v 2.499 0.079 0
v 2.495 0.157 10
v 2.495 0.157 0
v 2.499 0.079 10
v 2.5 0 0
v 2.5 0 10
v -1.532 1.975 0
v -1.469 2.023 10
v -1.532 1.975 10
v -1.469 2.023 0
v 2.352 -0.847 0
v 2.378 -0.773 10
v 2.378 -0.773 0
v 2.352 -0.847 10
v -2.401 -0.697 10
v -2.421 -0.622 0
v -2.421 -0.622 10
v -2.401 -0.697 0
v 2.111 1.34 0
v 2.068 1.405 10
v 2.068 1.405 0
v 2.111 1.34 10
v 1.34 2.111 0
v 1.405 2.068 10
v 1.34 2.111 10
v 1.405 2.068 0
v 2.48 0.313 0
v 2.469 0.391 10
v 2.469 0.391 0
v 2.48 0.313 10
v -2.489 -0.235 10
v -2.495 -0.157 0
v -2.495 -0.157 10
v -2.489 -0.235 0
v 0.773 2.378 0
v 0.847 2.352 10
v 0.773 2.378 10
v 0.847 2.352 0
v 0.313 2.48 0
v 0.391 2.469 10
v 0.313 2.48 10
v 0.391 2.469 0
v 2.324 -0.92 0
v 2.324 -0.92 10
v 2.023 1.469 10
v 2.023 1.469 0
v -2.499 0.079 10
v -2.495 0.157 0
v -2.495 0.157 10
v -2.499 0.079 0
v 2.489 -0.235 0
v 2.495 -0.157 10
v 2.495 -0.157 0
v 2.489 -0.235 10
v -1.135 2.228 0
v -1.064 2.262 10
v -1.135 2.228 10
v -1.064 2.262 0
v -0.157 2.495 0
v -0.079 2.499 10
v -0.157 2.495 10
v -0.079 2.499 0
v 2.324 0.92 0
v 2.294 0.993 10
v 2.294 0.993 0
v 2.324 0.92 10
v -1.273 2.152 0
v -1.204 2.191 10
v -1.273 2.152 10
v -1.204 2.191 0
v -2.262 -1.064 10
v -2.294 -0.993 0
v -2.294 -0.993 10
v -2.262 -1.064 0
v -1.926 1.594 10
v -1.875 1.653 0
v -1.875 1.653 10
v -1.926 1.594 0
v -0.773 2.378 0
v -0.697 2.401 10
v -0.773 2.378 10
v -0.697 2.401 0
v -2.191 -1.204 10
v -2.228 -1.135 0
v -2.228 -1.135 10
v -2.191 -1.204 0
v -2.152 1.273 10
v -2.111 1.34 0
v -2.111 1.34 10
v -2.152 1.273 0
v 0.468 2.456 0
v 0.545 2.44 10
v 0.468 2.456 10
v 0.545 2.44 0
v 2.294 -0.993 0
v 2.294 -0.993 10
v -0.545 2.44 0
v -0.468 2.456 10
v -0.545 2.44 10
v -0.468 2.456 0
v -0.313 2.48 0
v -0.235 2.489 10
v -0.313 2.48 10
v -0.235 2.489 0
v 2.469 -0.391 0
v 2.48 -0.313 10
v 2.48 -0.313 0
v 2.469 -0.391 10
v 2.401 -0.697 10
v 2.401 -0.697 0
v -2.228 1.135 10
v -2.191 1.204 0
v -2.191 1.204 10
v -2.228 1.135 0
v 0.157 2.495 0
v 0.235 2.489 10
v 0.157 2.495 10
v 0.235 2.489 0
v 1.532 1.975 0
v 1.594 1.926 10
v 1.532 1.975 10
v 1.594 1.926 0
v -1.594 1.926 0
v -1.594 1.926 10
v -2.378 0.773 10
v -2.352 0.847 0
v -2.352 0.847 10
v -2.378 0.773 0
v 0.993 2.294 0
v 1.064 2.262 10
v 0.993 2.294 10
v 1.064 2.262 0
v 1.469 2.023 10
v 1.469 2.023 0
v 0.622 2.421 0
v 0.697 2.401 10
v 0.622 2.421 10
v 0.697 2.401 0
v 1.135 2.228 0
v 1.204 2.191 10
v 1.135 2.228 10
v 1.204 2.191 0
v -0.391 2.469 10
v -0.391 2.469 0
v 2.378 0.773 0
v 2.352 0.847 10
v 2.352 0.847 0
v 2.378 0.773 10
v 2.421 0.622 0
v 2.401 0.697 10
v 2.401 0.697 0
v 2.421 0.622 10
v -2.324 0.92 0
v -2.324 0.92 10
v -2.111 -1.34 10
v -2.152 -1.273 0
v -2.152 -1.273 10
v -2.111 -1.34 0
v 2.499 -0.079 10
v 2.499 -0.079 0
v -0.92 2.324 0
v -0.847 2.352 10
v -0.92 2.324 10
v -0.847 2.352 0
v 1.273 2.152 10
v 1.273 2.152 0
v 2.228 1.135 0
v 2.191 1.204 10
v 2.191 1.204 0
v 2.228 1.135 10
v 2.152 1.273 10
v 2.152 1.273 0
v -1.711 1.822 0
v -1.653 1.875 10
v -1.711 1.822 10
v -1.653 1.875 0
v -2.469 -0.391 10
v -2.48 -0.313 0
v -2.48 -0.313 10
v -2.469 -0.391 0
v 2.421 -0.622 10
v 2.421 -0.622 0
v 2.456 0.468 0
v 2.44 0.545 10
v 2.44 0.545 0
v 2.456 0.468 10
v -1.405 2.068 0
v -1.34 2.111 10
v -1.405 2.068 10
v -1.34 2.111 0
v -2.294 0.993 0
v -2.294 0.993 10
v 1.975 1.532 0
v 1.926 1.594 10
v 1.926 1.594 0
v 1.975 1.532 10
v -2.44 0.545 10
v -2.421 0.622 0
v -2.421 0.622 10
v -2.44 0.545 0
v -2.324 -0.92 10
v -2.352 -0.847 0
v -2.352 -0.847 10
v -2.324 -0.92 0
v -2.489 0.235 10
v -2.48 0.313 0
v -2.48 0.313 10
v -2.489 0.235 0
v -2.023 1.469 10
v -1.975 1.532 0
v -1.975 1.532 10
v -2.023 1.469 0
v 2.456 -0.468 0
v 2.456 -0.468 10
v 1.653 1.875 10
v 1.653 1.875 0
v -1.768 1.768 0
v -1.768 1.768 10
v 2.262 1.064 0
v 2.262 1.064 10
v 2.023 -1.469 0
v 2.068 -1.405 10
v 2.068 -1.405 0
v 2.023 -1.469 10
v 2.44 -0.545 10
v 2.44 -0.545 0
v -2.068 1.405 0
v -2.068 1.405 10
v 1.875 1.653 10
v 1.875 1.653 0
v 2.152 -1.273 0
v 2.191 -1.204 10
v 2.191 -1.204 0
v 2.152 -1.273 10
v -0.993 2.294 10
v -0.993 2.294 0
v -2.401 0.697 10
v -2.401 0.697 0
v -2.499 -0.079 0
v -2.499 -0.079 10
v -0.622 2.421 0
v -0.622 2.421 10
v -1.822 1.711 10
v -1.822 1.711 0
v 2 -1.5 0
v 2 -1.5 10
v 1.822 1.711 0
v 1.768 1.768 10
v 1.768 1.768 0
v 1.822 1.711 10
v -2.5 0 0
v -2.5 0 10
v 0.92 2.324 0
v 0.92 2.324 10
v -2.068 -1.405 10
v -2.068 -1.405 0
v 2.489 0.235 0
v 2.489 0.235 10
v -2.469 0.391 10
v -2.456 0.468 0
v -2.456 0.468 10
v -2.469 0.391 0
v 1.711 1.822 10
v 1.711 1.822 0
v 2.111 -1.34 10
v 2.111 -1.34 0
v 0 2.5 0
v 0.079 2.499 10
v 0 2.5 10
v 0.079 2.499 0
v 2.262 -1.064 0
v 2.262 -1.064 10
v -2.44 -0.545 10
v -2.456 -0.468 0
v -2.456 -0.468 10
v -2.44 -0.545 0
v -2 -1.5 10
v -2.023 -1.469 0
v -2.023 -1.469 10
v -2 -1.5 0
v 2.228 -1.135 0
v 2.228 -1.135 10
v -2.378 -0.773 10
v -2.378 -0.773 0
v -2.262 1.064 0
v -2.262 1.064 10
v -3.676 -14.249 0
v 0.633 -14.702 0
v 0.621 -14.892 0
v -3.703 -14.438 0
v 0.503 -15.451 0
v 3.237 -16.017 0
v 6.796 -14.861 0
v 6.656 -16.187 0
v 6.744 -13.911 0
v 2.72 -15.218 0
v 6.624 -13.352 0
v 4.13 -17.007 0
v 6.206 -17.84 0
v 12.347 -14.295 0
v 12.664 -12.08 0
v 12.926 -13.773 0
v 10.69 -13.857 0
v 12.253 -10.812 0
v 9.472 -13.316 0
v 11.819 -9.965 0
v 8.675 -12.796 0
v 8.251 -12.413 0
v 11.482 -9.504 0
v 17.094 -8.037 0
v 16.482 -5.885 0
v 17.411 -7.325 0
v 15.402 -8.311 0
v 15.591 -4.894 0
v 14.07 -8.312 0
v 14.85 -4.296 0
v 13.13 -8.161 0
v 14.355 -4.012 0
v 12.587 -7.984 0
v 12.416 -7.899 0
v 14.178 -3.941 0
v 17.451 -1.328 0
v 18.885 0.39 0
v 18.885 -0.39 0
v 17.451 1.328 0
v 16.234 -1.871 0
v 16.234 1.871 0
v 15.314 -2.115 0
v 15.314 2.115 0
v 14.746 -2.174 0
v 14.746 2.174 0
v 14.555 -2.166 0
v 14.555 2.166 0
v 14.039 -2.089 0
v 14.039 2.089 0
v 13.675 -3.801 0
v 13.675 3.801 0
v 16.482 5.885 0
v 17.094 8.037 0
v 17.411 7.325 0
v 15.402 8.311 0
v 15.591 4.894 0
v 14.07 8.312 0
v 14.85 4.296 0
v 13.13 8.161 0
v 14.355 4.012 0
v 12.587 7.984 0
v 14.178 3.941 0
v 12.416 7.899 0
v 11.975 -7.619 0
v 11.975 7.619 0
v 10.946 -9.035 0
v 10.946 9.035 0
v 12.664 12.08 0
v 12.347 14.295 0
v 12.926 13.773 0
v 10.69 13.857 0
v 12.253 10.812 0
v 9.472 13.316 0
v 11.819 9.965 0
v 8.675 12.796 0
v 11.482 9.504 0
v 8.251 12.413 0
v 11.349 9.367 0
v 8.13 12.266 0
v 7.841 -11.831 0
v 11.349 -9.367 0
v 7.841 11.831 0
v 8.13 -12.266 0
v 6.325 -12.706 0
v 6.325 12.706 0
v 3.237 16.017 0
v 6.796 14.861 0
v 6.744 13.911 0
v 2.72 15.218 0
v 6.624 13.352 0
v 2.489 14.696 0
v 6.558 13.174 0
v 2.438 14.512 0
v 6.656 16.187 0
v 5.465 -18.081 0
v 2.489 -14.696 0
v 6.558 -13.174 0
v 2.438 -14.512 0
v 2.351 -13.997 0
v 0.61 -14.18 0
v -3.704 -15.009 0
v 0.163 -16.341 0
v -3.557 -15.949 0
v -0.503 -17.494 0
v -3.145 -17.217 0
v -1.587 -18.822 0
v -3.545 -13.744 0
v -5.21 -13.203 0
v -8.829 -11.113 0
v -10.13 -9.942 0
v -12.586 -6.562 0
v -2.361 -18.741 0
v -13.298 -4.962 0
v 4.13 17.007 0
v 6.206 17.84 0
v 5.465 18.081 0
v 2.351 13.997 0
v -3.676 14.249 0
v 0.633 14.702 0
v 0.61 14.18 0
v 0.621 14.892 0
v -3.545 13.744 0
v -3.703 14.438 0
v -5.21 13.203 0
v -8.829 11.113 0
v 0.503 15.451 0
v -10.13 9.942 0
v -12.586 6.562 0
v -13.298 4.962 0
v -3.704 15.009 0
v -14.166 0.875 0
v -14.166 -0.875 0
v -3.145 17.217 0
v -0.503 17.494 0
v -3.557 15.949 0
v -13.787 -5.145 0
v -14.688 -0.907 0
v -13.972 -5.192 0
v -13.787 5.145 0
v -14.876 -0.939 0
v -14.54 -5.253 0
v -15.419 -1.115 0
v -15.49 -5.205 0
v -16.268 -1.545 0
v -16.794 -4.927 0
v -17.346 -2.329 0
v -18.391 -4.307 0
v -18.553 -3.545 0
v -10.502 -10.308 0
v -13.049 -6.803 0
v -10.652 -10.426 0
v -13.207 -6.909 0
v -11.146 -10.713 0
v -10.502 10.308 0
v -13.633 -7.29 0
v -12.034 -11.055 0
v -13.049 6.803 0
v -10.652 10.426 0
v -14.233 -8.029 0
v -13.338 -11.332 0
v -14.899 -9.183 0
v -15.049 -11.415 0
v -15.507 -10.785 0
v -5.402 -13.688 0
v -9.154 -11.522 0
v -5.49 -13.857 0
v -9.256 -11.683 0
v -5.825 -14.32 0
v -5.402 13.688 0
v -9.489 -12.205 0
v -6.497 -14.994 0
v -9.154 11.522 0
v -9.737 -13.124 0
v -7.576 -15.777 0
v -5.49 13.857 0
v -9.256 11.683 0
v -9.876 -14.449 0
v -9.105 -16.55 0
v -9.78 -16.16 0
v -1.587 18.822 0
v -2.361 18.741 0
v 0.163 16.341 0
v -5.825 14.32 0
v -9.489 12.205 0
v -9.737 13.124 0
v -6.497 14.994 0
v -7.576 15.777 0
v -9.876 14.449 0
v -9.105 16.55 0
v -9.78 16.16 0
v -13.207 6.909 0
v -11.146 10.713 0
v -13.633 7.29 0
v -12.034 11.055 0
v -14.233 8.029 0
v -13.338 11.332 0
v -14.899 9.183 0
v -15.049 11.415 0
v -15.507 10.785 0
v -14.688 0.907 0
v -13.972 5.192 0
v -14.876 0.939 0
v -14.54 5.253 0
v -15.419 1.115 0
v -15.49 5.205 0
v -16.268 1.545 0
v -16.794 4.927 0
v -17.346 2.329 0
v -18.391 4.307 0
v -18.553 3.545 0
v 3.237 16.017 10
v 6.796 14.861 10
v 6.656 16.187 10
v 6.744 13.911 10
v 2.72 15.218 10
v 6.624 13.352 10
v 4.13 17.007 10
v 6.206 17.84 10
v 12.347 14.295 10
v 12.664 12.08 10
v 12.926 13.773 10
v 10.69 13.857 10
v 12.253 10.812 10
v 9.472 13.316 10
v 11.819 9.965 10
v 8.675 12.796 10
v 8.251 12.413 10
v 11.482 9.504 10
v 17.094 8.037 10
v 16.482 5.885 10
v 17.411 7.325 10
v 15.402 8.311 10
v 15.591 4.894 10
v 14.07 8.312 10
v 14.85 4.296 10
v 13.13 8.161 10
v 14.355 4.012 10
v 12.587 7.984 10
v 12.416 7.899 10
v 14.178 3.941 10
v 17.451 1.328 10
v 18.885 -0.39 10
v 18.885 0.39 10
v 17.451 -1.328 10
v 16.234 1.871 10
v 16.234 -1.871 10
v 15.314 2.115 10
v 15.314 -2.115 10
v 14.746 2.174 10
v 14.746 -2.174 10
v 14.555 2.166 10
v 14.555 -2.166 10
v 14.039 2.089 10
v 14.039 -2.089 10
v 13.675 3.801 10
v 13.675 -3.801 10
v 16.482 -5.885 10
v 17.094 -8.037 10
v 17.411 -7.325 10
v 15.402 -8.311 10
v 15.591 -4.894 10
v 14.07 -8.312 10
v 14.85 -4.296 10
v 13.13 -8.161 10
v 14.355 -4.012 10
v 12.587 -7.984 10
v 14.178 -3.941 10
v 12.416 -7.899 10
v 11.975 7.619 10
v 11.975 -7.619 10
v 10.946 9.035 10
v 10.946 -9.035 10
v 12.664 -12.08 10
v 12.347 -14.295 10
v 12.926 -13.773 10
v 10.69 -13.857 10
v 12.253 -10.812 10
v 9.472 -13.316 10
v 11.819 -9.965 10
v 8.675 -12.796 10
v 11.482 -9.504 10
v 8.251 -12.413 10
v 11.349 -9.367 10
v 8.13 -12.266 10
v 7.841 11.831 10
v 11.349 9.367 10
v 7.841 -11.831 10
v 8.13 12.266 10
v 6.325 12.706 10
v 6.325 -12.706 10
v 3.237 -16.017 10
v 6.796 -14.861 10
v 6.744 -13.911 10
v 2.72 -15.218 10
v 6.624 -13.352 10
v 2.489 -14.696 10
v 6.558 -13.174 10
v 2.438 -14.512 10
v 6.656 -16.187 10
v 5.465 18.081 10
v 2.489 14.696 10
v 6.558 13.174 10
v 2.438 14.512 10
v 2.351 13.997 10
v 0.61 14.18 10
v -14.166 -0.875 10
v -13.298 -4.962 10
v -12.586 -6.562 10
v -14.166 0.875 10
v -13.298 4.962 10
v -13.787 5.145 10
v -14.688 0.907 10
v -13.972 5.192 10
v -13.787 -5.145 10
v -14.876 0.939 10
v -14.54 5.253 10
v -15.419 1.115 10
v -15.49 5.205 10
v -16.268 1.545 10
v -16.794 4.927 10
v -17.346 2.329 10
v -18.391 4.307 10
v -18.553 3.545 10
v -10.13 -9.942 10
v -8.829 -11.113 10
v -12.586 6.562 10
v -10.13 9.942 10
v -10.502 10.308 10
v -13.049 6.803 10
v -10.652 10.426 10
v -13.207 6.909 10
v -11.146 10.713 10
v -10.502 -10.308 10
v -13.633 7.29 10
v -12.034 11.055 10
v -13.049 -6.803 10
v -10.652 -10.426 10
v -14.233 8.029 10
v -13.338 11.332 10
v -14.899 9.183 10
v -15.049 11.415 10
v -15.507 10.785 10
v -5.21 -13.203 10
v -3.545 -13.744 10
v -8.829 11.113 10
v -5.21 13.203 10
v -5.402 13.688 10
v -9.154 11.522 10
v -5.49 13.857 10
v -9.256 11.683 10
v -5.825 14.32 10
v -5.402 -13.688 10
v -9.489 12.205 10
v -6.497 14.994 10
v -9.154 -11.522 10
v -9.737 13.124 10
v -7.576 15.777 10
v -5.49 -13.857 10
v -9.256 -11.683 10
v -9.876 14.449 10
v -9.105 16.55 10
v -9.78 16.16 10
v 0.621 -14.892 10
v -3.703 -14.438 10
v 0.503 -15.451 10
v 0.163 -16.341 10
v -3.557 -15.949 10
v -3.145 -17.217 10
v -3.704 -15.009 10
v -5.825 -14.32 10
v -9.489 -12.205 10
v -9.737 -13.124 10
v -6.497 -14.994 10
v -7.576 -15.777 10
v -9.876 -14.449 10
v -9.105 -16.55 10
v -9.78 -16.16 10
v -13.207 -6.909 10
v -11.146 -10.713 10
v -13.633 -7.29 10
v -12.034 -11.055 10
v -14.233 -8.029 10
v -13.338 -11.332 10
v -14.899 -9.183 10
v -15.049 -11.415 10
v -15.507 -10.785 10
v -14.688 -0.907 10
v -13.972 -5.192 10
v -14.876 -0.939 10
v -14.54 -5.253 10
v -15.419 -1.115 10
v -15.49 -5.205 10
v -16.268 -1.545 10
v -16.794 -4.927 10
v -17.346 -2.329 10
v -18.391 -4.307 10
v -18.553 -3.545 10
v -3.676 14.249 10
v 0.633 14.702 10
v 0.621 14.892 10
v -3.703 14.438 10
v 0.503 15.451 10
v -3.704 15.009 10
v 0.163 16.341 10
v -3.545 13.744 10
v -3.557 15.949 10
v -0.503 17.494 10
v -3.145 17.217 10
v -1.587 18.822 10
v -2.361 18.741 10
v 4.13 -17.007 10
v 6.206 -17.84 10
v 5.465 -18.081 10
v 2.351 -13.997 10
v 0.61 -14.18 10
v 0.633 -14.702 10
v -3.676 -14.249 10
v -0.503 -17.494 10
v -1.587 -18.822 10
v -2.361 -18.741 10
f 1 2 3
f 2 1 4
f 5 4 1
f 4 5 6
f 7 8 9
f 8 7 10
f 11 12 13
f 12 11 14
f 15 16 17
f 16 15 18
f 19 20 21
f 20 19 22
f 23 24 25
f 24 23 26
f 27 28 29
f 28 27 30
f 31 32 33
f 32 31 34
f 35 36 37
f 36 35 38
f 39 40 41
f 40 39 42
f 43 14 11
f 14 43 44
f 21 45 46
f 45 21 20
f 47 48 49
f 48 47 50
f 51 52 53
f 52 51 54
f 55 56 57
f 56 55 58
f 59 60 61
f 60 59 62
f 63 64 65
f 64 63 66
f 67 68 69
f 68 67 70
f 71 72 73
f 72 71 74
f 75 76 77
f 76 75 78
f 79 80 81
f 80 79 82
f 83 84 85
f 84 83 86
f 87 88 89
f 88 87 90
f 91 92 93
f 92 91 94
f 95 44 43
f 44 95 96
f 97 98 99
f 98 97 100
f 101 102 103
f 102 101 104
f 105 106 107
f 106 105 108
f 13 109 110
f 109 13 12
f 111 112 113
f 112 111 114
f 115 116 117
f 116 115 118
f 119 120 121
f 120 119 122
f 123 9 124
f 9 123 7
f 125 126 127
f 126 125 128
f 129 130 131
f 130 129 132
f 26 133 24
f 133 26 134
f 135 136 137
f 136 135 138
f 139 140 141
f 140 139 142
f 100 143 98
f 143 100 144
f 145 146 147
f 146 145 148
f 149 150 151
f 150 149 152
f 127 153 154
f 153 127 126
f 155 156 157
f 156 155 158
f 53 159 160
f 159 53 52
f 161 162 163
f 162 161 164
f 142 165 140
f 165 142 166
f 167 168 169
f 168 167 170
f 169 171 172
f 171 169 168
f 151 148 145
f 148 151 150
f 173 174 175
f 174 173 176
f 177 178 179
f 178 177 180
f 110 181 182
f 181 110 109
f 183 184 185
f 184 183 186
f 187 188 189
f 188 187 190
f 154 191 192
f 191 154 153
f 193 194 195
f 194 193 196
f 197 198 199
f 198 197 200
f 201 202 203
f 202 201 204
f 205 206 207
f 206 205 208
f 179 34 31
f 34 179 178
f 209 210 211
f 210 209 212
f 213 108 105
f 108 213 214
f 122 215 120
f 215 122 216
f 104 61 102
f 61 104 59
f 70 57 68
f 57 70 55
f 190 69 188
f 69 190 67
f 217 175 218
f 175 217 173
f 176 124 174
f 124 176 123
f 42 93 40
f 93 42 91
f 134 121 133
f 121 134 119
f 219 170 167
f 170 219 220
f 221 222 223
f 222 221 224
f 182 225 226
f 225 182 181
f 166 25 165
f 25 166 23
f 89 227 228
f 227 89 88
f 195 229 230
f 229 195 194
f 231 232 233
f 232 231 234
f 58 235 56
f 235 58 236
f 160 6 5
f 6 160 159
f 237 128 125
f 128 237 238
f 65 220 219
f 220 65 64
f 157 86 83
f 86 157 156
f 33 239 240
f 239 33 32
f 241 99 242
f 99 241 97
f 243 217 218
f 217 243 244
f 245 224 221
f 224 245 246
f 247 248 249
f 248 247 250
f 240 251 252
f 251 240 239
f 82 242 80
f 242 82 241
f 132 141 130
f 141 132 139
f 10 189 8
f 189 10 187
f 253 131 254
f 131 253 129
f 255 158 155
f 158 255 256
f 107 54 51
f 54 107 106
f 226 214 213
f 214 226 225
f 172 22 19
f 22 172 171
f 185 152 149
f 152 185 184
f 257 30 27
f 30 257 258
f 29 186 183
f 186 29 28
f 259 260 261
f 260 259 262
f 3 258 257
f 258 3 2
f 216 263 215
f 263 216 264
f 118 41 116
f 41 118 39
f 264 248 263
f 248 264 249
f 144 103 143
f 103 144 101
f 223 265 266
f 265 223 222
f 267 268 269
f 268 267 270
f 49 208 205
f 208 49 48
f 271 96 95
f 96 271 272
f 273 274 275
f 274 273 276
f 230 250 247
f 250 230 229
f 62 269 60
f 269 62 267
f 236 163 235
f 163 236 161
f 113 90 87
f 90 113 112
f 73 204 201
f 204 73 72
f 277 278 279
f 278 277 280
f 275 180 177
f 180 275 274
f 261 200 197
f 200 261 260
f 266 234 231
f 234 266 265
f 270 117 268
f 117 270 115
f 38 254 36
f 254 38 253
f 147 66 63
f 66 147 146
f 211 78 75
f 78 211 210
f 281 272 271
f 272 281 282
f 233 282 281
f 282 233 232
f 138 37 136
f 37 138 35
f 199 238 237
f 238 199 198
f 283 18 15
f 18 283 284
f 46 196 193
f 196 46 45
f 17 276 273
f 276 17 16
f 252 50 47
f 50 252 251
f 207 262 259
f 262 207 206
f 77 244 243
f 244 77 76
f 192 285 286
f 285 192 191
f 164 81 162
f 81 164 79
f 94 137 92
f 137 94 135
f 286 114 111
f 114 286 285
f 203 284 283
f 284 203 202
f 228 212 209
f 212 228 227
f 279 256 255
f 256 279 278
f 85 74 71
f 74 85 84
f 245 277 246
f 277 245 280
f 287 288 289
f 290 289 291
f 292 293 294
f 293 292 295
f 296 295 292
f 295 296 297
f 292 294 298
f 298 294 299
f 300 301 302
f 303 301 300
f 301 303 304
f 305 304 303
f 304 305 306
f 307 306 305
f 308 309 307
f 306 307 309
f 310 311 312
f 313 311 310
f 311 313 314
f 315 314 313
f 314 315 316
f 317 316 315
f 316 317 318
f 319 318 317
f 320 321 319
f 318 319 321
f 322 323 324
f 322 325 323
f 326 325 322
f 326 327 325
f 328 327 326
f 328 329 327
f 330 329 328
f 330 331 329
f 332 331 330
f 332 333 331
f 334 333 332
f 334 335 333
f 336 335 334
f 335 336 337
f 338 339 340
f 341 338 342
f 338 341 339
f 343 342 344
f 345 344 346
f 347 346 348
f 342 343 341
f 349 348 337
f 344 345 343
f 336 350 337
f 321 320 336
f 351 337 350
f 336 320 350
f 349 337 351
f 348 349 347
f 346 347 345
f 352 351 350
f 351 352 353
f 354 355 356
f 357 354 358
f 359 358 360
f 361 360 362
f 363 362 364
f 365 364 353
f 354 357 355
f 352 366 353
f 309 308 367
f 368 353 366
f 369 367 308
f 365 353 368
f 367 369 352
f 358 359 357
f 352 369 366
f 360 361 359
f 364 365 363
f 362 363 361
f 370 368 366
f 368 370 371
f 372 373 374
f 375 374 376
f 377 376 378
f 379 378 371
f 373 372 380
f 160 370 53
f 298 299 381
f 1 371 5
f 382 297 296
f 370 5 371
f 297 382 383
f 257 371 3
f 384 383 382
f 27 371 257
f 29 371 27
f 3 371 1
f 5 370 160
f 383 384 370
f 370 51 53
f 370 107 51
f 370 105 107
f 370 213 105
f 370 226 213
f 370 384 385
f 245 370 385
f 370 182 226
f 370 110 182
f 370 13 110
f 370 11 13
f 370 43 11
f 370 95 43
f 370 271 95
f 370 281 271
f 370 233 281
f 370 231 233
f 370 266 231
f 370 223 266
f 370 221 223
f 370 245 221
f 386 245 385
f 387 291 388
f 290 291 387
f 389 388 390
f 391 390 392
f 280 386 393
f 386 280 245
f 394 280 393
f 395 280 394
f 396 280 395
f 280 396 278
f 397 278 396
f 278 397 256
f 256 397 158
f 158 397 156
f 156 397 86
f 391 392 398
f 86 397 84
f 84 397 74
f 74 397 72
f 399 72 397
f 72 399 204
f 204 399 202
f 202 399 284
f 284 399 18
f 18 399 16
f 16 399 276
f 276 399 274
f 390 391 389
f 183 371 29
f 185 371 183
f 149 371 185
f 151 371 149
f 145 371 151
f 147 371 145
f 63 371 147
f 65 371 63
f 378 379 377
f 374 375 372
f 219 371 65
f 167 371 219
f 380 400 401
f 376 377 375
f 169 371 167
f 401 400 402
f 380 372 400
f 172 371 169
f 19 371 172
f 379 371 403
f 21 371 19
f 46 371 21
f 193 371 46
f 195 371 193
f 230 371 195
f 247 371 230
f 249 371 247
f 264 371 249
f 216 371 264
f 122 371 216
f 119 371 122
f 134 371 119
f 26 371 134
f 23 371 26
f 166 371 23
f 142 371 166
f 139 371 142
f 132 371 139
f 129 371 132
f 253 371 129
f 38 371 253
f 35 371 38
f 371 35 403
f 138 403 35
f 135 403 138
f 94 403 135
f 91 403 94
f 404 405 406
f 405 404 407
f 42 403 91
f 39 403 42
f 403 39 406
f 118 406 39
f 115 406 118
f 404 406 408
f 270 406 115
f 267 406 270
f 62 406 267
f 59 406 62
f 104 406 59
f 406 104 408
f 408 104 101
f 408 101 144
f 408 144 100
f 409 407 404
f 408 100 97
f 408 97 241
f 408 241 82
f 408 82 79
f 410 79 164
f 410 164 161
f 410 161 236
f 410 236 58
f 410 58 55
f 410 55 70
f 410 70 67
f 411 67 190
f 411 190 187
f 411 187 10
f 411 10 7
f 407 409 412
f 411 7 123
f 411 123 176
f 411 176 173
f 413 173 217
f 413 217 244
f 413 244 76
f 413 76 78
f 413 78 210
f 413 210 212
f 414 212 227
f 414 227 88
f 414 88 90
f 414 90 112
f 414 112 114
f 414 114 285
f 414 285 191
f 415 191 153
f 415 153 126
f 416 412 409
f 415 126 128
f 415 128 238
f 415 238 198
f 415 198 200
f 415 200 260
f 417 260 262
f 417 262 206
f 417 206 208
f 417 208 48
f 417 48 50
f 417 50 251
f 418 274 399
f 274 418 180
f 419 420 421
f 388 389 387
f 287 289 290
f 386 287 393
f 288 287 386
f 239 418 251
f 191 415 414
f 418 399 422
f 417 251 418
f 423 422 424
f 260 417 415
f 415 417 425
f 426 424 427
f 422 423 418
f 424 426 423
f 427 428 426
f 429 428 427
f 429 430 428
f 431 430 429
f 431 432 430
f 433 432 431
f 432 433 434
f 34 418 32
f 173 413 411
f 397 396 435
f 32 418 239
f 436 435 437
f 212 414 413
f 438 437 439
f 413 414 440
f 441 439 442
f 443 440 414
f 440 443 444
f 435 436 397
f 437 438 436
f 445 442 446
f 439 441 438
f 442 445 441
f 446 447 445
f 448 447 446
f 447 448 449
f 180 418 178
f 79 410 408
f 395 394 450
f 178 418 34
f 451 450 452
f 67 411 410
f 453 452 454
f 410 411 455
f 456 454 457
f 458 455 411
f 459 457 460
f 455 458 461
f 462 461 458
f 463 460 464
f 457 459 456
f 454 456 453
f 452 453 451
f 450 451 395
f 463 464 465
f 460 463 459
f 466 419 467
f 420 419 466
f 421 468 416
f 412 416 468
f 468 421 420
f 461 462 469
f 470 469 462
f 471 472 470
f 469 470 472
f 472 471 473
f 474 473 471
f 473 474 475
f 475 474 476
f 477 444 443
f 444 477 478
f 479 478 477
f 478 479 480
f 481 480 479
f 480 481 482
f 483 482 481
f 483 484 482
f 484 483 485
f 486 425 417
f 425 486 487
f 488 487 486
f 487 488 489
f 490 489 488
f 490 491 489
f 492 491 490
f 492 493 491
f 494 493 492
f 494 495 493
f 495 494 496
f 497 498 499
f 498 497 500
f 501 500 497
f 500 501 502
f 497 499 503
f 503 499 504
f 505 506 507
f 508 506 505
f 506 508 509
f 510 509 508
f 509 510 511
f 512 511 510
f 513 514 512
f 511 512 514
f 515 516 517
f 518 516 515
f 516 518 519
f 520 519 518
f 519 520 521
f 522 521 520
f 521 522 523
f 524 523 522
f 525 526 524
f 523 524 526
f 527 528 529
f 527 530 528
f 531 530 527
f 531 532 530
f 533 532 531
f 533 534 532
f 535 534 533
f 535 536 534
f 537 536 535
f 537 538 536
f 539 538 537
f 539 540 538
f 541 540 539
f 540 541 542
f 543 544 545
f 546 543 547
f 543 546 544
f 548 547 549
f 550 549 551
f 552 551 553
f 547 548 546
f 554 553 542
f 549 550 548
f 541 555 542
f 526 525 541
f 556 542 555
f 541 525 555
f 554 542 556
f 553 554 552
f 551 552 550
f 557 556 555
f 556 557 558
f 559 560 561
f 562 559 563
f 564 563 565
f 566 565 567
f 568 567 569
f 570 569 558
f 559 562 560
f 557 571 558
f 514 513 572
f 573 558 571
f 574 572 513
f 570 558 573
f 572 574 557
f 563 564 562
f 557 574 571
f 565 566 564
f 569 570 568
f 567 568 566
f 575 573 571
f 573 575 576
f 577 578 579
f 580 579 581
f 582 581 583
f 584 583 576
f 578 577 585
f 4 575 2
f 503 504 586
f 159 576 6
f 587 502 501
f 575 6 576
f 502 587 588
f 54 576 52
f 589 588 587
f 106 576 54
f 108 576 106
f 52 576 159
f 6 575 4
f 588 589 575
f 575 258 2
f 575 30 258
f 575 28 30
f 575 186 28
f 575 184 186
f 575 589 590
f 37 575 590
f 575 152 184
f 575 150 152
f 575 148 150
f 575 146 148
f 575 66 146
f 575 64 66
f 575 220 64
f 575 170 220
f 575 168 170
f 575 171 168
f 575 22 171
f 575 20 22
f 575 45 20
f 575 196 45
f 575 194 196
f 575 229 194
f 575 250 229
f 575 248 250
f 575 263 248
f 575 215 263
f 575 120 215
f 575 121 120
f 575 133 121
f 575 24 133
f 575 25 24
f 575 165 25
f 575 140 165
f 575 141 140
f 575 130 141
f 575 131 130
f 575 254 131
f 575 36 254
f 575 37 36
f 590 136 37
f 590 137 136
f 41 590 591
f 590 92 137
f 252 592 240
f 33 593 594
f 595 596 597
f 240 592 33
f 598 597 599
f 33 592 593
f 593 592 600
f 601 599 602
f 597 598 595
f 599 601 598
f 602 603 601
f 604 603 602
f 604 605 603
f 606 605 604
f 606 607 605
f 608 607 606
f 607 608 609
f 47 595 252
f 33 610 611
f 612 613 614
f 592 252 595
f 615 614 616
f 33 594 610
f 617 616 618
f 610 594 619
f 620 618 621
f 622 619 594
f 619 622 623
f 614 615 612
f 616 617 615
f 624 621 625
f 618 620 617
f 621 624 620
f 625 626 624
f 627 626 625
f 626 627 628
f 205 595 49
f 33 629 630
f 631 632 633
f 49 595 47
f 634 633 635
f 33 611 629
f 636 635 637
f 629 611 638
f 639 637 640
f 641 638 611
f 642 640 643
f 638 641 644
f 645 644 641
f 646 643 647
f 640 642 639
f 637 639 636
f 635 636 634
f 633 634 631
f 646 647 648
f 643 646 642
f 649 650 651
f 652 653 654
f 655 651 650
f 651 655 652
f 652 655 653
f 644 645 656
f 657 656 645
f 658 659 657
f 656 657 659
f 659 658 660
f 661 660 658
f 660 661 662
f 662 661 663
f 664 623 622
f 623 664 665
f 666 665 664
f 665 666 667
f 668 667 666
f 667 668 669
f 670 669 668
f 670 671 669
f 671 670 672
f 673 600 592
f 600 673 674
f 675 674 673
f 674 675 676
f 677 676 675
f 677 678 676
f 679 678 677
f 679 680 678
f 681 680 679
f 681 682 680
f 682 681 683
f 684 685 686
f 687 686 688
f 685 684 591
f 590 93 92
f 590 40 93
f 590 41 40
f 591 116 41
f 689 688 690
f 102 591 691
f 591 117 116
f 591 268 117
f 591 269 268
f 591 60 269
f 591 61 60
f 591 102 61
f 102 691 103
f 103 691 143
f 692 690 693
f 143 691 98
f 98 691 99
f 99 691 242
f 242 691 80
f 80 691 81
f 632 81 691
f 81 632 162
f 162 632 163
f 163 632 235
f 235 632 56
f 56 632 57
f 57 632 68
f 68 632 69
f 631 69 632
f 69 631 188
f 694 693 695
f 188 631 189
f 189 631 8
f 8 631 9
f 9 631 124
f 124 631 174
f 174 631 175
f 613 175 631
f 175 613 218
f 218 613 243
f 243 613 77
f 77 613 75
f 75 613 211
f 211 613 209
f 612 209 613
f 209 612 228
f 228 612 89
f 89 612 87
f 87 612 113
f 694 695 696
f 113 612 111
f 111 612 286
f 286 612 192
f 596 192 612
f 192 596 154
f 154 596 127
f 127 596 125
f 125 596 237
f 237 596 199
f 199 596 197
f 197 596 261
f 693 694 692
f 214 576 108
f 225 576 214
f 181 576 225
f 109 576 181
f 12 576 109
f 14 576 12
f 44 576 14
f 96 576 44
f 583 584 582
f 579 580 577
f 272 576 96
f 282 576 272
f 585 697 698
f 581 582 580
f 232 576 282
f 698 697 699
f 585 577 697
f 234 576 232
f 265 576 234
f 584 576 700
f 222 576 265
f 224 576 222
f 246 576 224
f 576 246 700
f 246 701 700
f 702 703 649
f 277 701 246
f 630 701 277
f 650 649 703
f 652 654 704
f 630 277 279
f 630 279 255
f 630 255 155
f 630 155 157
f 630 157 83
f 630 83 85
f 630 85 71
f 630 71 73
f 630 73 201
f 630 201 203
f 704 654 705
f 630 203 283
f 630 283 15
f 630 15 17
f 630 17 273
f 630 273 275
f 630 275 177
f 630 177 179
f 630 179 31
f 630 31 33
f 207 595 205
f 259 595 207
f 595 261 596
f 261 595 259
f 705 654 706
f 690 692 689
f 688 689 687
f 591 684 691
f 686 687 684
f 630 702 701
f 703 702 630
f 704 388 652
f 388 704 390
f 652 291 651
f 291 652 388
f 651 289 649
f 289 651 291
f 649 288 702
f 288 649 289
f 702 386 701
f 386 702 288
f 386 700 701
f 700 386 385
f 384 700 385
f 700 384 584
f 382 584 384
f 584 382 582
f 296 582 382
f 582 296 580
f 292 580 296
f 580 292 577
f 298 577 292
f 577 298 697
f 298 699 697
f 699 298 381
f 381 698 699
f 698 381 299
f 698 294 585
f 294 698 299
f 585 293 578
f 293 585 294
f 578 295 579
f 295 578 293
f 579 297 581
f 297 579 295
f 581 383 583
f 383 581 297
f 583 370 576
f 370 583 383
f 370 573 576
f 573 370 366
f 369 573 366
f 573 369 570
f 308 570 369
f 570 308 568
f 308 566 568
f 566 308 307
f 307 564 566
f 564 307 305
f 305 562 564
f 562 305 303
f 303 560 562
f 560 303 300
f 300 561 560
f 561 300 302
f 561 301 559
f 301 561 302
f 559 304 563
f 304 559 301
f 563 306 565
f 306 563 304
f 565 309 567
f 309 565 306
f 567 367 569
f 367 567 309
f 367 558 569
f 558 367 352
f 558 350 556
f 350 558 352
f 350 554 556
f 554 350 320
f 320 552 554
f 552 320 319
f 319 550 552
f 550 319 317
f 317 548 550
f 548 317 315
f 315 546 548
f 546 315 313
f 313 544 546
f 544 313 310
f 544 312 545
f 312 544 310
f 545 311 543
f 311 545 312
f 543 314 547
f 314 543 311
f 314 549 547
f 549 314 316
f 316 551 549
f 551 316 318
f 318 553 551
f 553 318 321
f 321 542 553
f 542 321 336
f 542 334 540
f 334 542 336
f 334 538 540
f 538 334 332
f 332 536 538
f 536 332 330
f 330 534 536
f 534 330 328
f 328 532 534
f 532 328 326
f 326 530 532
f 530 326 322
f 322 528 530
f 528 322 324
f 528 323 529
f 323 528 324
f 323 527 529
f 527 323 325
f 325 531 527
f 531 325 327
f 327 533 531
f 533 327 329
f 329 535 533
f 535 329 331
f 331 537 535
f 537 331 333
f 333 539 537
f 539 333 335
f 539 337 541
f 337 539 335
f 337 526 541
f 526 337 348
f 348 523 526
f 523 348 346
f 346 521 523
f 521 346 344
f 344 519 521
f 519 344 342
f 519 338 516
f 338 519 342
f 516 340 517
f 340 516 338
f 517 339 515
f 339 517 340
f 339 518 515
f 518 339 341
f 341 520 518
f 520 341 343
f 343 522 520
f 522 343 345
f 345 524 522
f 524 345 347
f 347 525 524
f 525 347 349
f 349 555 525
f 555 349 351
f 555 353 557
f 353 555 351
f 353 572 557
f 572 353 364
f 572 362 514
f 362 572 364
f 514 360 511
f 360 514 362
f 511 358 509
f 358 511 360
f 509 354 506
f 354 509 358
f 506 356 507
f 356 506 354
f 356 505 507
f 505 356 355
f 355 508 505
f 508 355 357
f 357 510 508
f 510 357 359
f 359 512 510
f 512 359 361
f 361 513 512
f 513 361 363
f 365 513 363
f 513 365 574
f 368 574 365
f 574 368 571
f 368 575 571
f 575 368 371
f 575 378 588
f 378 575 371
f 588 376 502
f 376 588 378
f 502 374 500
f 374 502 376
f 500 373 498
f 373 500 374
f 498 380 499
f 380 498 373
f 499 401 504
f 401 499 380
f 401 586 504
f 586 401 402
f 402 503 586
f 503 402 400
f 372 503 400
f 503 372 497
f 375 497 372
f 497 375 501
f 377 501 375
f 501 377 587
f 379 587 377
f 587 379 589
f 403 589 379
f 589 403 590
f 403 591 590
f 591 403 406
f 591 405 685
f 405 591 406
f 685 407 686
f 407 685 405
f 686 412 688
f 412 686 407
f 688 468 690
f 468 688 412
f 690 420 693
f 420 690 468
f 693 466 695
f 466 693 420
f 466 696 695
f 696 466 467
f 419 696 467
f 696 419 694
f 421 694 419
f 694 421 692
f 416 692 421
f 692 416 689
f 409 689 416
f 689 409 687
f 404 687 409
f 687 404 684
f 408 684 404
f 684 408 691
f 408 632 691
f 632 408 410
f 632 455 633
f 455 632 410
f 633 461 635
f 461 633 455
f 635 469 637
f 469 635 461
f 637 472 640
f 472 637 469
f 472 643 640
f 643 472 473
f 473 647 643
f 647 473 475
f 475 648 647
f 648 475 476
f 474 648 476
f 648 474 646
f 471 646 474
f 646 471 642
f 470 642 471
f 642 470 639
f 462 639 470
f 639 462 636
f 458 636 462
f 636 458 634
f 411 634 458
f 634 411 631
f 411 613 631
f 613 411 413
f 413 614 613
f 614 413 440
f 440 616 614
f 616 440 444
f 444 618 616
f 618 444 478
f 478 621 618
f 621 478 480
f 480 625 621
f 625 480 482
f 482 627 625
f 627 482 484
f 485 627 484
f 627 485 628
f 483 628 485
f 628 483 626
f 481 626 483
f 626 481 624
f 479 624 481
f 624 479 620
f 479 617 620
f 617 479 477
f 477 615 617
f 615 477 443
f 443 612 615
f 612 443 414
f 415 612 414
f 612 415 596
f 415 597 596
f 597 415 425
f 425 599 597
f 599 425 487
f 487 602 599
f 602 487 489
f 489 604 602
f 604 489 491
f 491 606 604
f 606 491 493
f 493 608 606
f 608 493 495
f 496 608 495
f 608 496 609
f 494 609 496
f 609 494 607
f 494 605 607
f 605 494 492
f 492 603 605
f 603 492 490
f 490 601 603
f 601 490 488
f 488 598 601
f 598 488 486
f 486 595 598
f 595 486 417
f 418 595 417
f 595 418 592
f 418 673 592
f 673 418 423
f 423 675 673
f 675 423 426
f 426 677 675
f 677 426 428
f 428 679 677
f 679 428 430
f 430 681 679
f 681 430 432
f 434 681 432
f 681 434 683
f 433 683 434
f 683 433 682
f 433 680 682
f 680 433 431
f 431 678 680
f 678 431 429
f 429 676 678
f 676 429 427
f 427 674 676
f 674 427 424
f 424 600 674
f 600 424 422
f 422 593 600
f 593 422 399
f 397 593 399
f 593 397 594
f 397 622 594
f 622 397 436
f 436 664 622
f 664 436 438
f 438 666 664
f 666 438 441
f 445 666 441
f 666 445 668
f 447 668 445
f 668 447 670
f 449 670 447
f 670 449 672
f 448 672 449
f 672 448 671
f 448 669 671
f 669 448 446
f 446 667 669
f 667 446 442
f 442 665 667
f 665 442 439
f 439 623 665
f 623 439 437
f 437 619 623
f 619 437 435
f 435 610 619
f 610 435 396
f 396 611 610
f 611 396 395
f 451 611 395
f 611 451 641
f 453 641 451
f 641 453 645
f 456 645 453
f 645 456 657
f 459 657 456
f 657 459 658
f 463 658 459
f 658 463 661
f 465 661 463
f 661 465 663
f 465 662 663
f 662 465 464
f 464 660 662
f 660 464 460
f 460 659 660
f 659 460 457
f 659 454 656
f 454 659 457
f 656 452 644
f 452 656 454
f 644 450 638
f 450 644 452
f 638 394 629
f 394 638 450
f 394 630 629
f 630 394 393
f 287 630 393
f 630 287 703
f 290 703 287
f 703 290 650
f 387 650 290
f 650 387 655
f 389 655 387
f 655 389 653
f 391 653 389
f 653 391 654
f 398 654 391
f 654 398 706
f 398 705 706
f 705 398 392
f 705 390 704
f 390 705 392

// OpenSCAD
// Parametric Involute Bevel and Spur Gears by GregFrost
// It is licensed under the Creative Commons - GNU GPL license.
// © 2010 by GregFrost
// http://www.thingiverse.com/thing:3575

// Simple Test:
//projection()
gear (circular_pitch=400,gear_thickness = 10,rim_thickness = 10,hub_thickness = 10, circles=0, bore_diameter=5);

//Complex Spur Gear Test:
//test_gears ();

// Meshing Double Helix:
//meshing_double_helix ();

// Demonstrate the backlash option for Spur gears.
//test_backlash ();

// Demonstrate how to make meshing bevel gears.
//bevel_gear_pair ();

pi=3.1415926535897932384626433832795;



module build_shaft(bore_diameter , rim_thickness ,hub_thickness ,gear_thickness )
{
    intersection(){
		 cylinder (	r=bore_diameter/2,h=2+max(rim_thickness,hub_thickness,gear_thickness), $fn=200);

     translate([0,1,5 ])
   // cube([bore_diameter/2,max(rim_thickness,hub_thickness,gear_thickness),bore_diameter/2],center=true);

         cube([10,5,20],center=true);
     }
}


module build_shaftx()
{
    translate([+width/2-55,-tablet_length/2-14,0])
    cube([15,31,height * 0.7],center=true);
}


//==================================================
// Bevel Gears:
// Two gears with the same cone distance, circular pitch (measured at the cone distance) 
// and pressure angle will mesh.

module bevel_gear_pair (
	gear1_teeth = 41,
	gear2_teeth = 7,
	axis_angle = 90,
	outside_circular_pitch=1000)
{
	outside_pitch_radius1 = gear1_teeth * outside_circular_pitch / 360;
	outside_pitch_radius2 = gear2_teeth * outside_circular_pitch / 360;
	pitch_apex1=outside_pitch_radius2 * sin (axis_angle) + 
		(outside_pitch_radius2 * cos (axis_angle) + outside_pitch_radius1) / tan (axis_angle);
	cone_distance = sqrt (pow (pitch_apex1, 2) + pow (outside_pitch_radius1, 2));
	pitch_apex2 = sqrt (pow (cone_distance, 2) - pow (outside_pitch_radius2, 2));
	echo ("cone_distance", cone_distance);
	pitch_angle1 = asin (outside_pitch_radius1 / cone_distance);
	pitch_angle2 = asin (outside_pitch_radius2 / cone_distance);
	echo ("pitch_angle1, pitch_angle2", pitch_angle1, pitch_angle2);
	echo ("pitch_angle1 + pitch_angle2", pitch_angle1 + pitch_angle2);

	rotate([0,0,90])
	translate ([0,0,pitch_apex1+20])
	{
		translate([0,0,-pitch_apex1])
		bevel_gear (
			number_of_teeth=gear1_teeth,
			cone_distance=cone_distance,
			pressure_angle=30,
			outside_circular_pitch=outside_circular_pitch);
	
		rotate([0,-(pitch_angle1+pitch_angle2),0])
		translate([0,0,-pitch_apex2])
		bevel_gear (
			number_of_teeth=gear2_teeth,
			cone_distance=cone_distance,
			pressure_angle=30,
			outside_circular_pitch=outside_circular_pitch);
	}
}

//Bevel Gear Finishing Options:
bevel_gear_flat = 0;
bevel_gear_back_cone = 1;

module bevel_gear (
	number_of_teeth=11,
	cone_distance=100,
	face_width=20,
	outside_circular_pitch=1000,
	pressure_angle=30,
	clearance = 0.2,
	bore_diameter=5,
	gear_thickness = 15,
	backlash = 0,
	involute_facets=0,
	finish = -1)
{
	echo ("bevel_gear",
		"teeth", number_of_teeth,
		"cone distance", cone_distance,
		face_width,
		outside_circular_pitch,
		pressure_angle,
		clearance,
		bore_diameter,
		involute_facets,
		finish);

	// Pitch diameter: Diameter of pitch circle at the fat end of the gear.
	outside_pitch_diameter  =  number_of_teeth * outside_circular_pitch / 180;
	outside_pitch_radius = outside_pitch_diameter / 2;

	// The height of the pitch apex.
	pitch_apex = sqrt (pow (cone_distance, 2) - pow (outside_pitch_radius, 2));
	pitch_angle = asin (outside_pitch_radius/cone_distance);

	echo ("Num Teeth:", number_of_teeth, " Pitch Angle:", pitch_angle);

	finish = (finish != -1) ? finish : (pitch_angle < 45) ? bevel_gear_flat : bevel_gear_back_cone;

	apex_to_apex=cone_distance / cos (pitch_angle);
	back_cone_radius = apex_to_apex * sin (pitch_angle);

	// Calculate and display the pitch angle. This is needed to determine the angle to mount two meshing cone gears.

	// Base Circle for forming the involute teeth shape.
	base_radius = back_cone_radius * cos (pressure_angle);	

	// Diametrial pitch: Number of teeth per unit length.
	pitch_diametrial = number_of_teeth / outside_pitch_diameter;

	// Addendum: Radial distance from pitch circle to outside circle.
	addendum = 1 / pitch_diametrial;
	// Outer Circle
	outer_radius = back_cone_radius + addendum;

	// Dedendum: Radial distance from pitch circle to root diameter
	dedendum = addendum + clearance;
	dedendum_angle = atan (dedendum / cone_distance);
	root_angle = pitch_angle - dedendum_angle;

	root_cone_full_radius = tan (root_angle)*apex_to_apex;
	back_cone_full_radius=apex_to_apex / tan (pitch_angle);

	back_cone_end_radius = 
		outside_pitch_radius - 
		dedendum * cos (pitch_angle) - 
		gear_thickness / tan (pitch_angle);
	back_cone_descent = dedendum * sin (pitch_angle) + gear_thickness;

	// Root diameter: Diameter of bottom of tooth spaces.
	root_radius = back_cone_radius - dedendum;

	half_tooth_thickness = outside_pitch_radius * sin (360 / (4 * number_of_teeth)) - backlash / 4;
	half_thick_angle = asin (half_tooth_thickness / back_cone_radius);

	face_cone_height = apex_to_apex-face_width / cos (pitch_angle);
	face_cone_full_radius = face_cone_height / tan (pitch_angle);
	face_cone_descent = dedendum * sin (pitch_angle);
	face_cone_end_radius = 
		outside_pitch_radius -
		face_width / sin (pitch_angle) - 
		face_cone_descent / tan (pitch_angle);

	// For the bevel_gear_flat finish option, calculate the height of a cube to select the portion of the gear that includes the full pitch face.
	bevel_gear_flat_height = pitch_apex - (cone_distance - face_width) * cos (pitch_angle);

//	translate([0,0,-pitch_apex])
	difference ()
	{
		intersection ()
		{
			union()
			{
				rotate (half_thick_angle)
				translate ([0,0,pitch_apex-apex_to_apex])
				cylinder ($fn=number_of_teeth*2, r1=root_cone_full_radius,r2=0,h=apex_to_apex);
				for (i = [1:number_of_teeth])
//				for (i = [1:1])
				{
					rotate ([0,0,i*360/number_of_teeth])
					{
						involute_bevel_gear_tooth (
							back_cone_radius = back_cone_radius,
							root_radius = root_radius,
							base_radius = base_radius,
							outer_radius = outer_radius,
							pitch_apex = pitch_apex,
							cone_distance = cone_distance,
							half_thick_angle = half_thick_angle,
							involute_facets = involute_facets);
					}
				}
			}

			if (finish == bevel_gear_back_cone)
			{
				translate ([0,0,-back_cone_descent])
				cylinder (
					$fn=number_of_teeth*2, 
					r1=back_cone_end_radius,
					r2=back_cone_full_radius*2,
					h=apex_to_apex + back_cone_descent);
			}
			else
			{
				translate ([-1.5*outside_pitch_radius,-1.5*outside_pitch_radius,0])
				cube ([3*outside_pitch_radius,
					3*outside_pitch_radius,
					bevel_gear_flat_height]);
			}
		}
		
		if (finish == bevel_gear_back_cone)
		{
			translate ([0,0,-face_cone_descent])
			cylinder (
				r1=face_cone_end_radius,
				r2=face_cone_full_radius * 2,
				h=face_cone_height + face_cone_descent+pitch_apex);
		}

		translate ([0,0,pitch_apex - apex_to_apex])
		cylinder (r=bore_diameter/2,h=apex_to_apex);
	}	
}

module involute_bevel_gear_tooth (
	back_cone_radius,
	root_radius,
	base_radius,
	outer_radius,
	pitch_apex,
	cone_distance,
	half_thick_angle,
	involute_facets)
{
//	echo ("involute_bevel_gear_tooth",
//		back_cone_radius,
//		root_radius,
//		base_radius,
//		outer_radius,
//		pitch_apex,
//		cone_distance,
//		half_thick_angle);

	min_radius = max (base_radius*2,root_radius*2);

	pitch_point = 
		involute (
			base_radius*2, 
			involute_intersect_angle (base_radius*2, back_cone_radius*2));
	pitch_angle = atan2 (pitch_point[1], pitch_point[0]);
	centre_angle = pitch_angle + half_thick_angle;

	start_angle = involute_intersect_angle (base_radius*2, min_radius);
	stop_angle = involute_intersect_angle (base_radius*2, outer_radius*2);

	res=(involute_facets!=0)?involute_facets:($fn==0)?5:$fn/4;

	translate ([0,0,pitch_apex])
	rotate ([0,-atan(back_cone_radius/cone_distance),0])
	translate ([-back_cone_radius*2,0,-cone_distance*2])
	union ()
	{
		for (i=[1:res])
		{
			assign (
				point1=
					involute (base_radius*2,start_angle+(stop_angle - start_angle)*(i-1)/res),
				point2=
					involute (base_radius*2,start_angle+(stop_angle - start_angle)*(i)/res))
			{
				assign (
					side1_point1 = rotate_point (centre_angle, point1),
					side1_point2 = rotate_point (centre_angle, point2),
					side2_point1 = mirror_point (rotate_point (centre_angle, point1)),
					side2_point2 = mirror_point (rotate_point (centre_angle, point2)))
				{
					polyhedron (
						points=[
							[back_cone_radius*2+0.1,0,cone_distance*2],
							[side1_point1[0],side1_point1[1],0],
							[side1_point2[0],side1_point2[1],0],
							[side2_point2[0],side2_point2[1],0],
							[side2_point1[0],side2_point1[1],0],
							[0.1,0,0]],
						triangles=[[0,1,2],[0,2,3],[0,3,4],[0,5,1],[1,5,2],[2,5,3],[3,5,4],[0,4,5]]);
				}
			}
		}
	}
}

module gear (
	number_of_teeth=15,
	circular_pitch=false, diametral_pitch=false,
	pressure_angle=28,
	clearance = 0.2,
	gear_thickness=5,
	rim_thickness=8,
	rim_width=5,
	hub_thickness=10,
	hub_diameter=15,
	bore_diameter=5,
	circles=0,
	backlash=0,
	twist=0,
	involute_facets=0)
{
	if (circular_pitch==false && diametral_pitch==false) 
		echo("MCAD ERROR: gear module needs either a diametral_pitch or circular_pitch");

	//Convert diametrial pitch to our native circular pitch
	circular_pitch = (circular_pitch!=false?circular_pitch:180/diametral_pitch);

	// Pitch diameter: Diameter of pitch circle.
	pitch_diameter  =  number_of_teeth * circular_pitch / 180;
	pitch_radius = pitch_diameter/2;
	echo ("Teeth:", number_of_teeth, " Pitch radius:", pitch_radius);

	// Base Circle
	base_radius = pitch_radius*cos(pressure_angle);

	// Diametrial pitch: Number of teeth per unit length.
	pitch_diametrial = number_of_teeth / pitch_diameter;

	// Addendum: Radial distance from pitch circle to outside circle.
	addendum = 1/pitch_diametrial;

	//Outer Circle
	outer_radius = pitch_radius+addendum;

	// Dedendum: Radial distance from pitch circle to root diameter
	dedendum = addendum + clearance;

	// Root diameter: Diameter of bottom of tooth spaces.
	root_radius = pitch_radius-dedendum;
	backlash_angle = backlash / pitch_radius * 180 / pi;
	half_thick_angle = (360 / number_of_teeth - backlash_angle) / 4;

	// Variables controlling the rim.
	rim_radius = root_radius - rim_width;

	// Variables controlling the circular holes in the gear.
	circle_orbit_diameter=hub_diameter/2+rim_radius;
	circle_orbit_curcumference=pi*circle_orbit_diameter;

	// Limit the circle size to 90% of the gear face.
	circle_diameter=
		min (
			0.70*circle_orbit_curcumference/circles,
			(rim_radius-hub_diameter/2)*0.9);

	difference ()
	{
		union ()
		{
			difference ()
			{
				linear_extrude (height=rim_thickness, convexity=10, twist=twist)
				gear_shape (
					number_of_teeth,
					pitch_radius = pitch_radius,
					root_radius = root_radius,
					base_radius = base_radius,
					outer_radius = outer_radius,
					half_thick_angle = half_thick_angle,
					involute_facets=involute_facets);

				if (gear_thickness < rim_thickness)
					translate ([0,0,gear_thickness])
					cylinder (r=rim_radius,h=rim_thickness-gear_thickness+1);
			}
			if (gear_thickness > rim_thickness)
				cylinder (r=rim_radius,h=gear_thickness);
			if (hub_thickness > gear_thickness)
				translate ([0,0,gear_thickness])
				cylinder (r=hub_diameter/2,h=hub_thickness-gear_thickness);
		}


		translate ([0,0,-1])

	//	cylinder (
	//		r=bore_diameter/2,
	//		h=2+max(rim_thickness,hub_thickness,gear_thickness));

     build_shaft(bore_diameter=bore_diameter, rim_thickness=rim_thickness,hub_thickness=hub_thickness,gear_thickness=gear_thickness  );



		if (circles>0)
		{
			for(i=[0:circles-1])	
				rotate([0,0,i*360/circles])
				translate([circle_orbit_diameter/2,0,-1])
				cylinder(r=circle_diameter/2,h=max(gear_thickness,rim_thickness)+3);
		}
	}
}

module gear_shape (
	number_of_teeth,
	pitch_radius,
	root_radius,
	base_radius,
	outer_radius,
	half_thick_angle,
	involute_facets)
{
	union()
	{
		rotate (half_thick_angle) circle ($fn=number_of_teeth*2, r=root_radius);

		for (i = [1:number_of_teeth])
		{
			rotate ([0,0,i*360/number_of_teeth])
			{
				involute_gear_tooth (
					pitch_radius = pitch_radius,
					root_radius = root_radius,
					base_radius = base_radius,
					outer_radius = outer_radius,
					half_thick_angle = half_thick_angle,
					involute_facets=involute_facets);
			}
		}
	}
}

module involute_gear_tooth (
	pitch_radius,
	root_radius,
	base_radius,
	outer_radius,
	half_thick_angle,
	involute_facets)
{
	min_radius = max (base_radius,root_radius);

	pitch_point = involute (base_radius, involute_intersect_angle (base_radius, pitch_radius));
	pitch_angle = atan2 (pitch_point[1], pitch_point[0]);
	centre_angle = pitch_angle + half_thick_angle;

	start_angle = involute_intersect_angle (base_radius, min_radius);
	stop_angle = involute_intersect_angle (base_radius, outer_radius);

	res=(involute_facets!=0)?involute_facets:($fn==0)?5:$fn/4;

	union ()
	{
		for (i=[1:res])
		assign (
			point1=involute (base_radius,start_angle+(stop_angle - start_angle)*(i-1)/res),
			point2=involute (base_radius,start_angle+(stop_angle - start_angle)*i/res))
		{
			assign (
				side1_point1=rotate_point (centre_angle, point1),
				side1_point2=rotate_point (centre_angle, point2),
				side2_point1=mirror_point (rotate_point (centre_angle, point1)),
				side2_point2=mirror_point (rotate_point (centre_angle, point2)))
			{
				polygon (
					points=[[0,0],side1_point1,side1_point2,side2_point2,side2_point1],
					paths=[[0,1,2,3,4,0]]);
			}
		}
	}
}

// Mathematical Functions
//===============

// Finds the angle of the involute about the base radius at the given distance (radius) from it's center.
//source: http://www.mathhelpforum.com/math-help/geometry/136011-circle-involute-solving-y-any-given-x.html

function involute_intersect_angle (base_radius, radius) = sqrt (pow (radius/base_radius, 2) - 1) * 180 / pi;

// Calculate the involute position for a given base radius and involute angle.

function rotated_involute (rotate, base_radius, involute_angle) = 
[
	cos (rotate) * involute (base_radius, involute_angle)[0] + sin (rotate) * involute (base_radius, involute_angle)[1],
	cos (rotate) * involute (base_radius, involute_angle)[1] - sin (rotate) * involute (base_radius, involute_angle)[0]
];

function mirror_point (coord) = 
[
	coord[0], 
	-coord[1]
];

function rotate_point (rotate, coord) =
[
	cos (rotate) * coord[0] + sin (rotate) * coord[1],
	cos (rotate) * coord[1] - sin (rotate) * coord[0]
];

function involute (base_radius, involute_angle) = 
[
	base_radius*(cos (involute_angle) + involute_angle*pi/180*sin (involute_angle)),
	base_radius*(sin (involute_angle) - involute_angle*pi/180*cos (involute_angle)),
];


// Test Cases
//===============

module test_gears()
{
	translate([17,-15])
	{
		gear (number_of_teeth=17,
			circular_pitch=500,
			circles=8);
	
		rotate ([0,0,360*4/17])
		translate ([39.088888,0,0])
		{
			gear (number_of_teeth=11,
				circular_pitch=500,
				hub_diameter=0,
				rim_width=65);
			translate ([0,0,8])
			{
				gear (number_of_teeth=6,
					circular_pitch=300,
					hub_diameter=0,
					rim_width=5,
					rim_thickness=6,
					pressure_angle=31);
				rotate ([0,0,360*5/6])
				translate ([22.5,0,1])
				gear (number_of_teeth=21,
					circular_pitch=300,
					bore_diameter=2,
					hub_diameter=4,
					rim_width=1,
					hub_thickness=4,
					rim_thickness=4,
					gear_thickness=3,
					pressure_angle=31);
			}
		}

		translate ([-61.1111111,0,0])
		{
			gear (number_of_teeth=27,
				circular_pitch=500,
				circles=5,
				hub_diameter=2*8.88888889);

			translate ([0,0,10])
			{
				gear (
					number_of_teeth=14,
					circular_pitch=200,
					pressure_angle=5,
					clearance = 0.2,
					gear_thickness = 10,
					rim_thickness = 10,
					rim_width = 15,
					bore_diameter=5,
					circles=0);
				translate ([13.8888888,0,1])
				gear (
					number_of_teeth=11,
					circular_pitch=200,
					pressure_angle=5,
					clearance = 0.2,
					gear_thickness = 10,
					rim_thickness = 10,
					rim_width = 15,
					hub_thickness = 20,
					hub_diameter=2*7.222222,
					bore_diameter=5,
					circles=0);
			}
		}
	
		rotate ([0,0,360*-5/17])
		translate ([44.444444444,0,0])
		gear (number_of_teeth=15,
			circular_pitch=500,
			hub_diameter=10,
			rim_width=5,
			rim_thickness=5,
			gear_thickness=4,
			hub_thickness=6,
			circles=9);
	
		rotate ([0,0,360*-1/17])
		translate ([30.5555555,0,-1])
		gear (number_of_teeth=5,
			circular_pitch=500,
			hub_diameter=0,
			rim_width=5,
			rim_thickness=10);
	}
}

module meshing_double_helix ()
{
	test_double_helix_gear ();
	
	mirror ([0,1,0])
	translate ([58.33333333,0,0])
	test_double_helix_gear (teeth=13,circles=6);
}

module test_double_helix_gear (
	teeth=17,
	circles=8)
{
	//double helical gear
	{
		twist=200;
		height=20;
		pressure_angle=30;

		gear (number_of_teeth=teeth,
			circular_pitch=700,
			pressure_angle=pressure_angle,
			clearance = 0.2,
			gear_thickness = height/2*0.5,
			rim_thickness = height/2,
			rim_width = 5,
			hub_thickness = height/2*1.2,
			hub_diameter=15,
			bore_diameter=5,
			circles=circles,
			twist=twist/teeth);
		mirror([0,0,1])
		gear (number_of_teeth=teeth,
			circular_pitch=700,
			pressure_angle=pressure_angle,
			clearance = 0.2,
			gear_thickness = height/2,
			rim_thickness = height/2,
			rim_width = 5,
			hub_thickness = height/2,
			hub_diameter=15,
			bore_diameter=5,
			circles=circles,
			twist=twist/teeth);
	}
}

module test_backlash ()
{
	backlash = 2;
	teeth = 15;

	translate ([-29.166666,0,0])
	{
		translate ([58.3333333,0,0])
		rotate ([0,0,-360/teeth/4])
		gear (
			number_of_teeth = teeth,
			circular_pitch=700,
			gear_thickness = 12,
			rim_thickness = 15,
			rim_width = 5,
			hub_thickness = 17,
			hub_diameter=15,
			bore_diameter=5,
			backlash = 2,
			circles=8);
		
		rotate ([0,0,360/teeth/4])
		gear (
			number_of_teeth = teeth,
			circular_pitch=700,
			gear_thickness = 12,
			rim_thickness = 15,
			rim_width = 5,
			hub_thickness = 17,
			hub_diameter=15,
			bore_diameter=5,
			backlash = 2,
			circles=8);
	}

	color([0,0,128,0.5])
	translate([0,0,-5])
	cylinder ($fn=20,r=backlash / 4,h=25);
}
